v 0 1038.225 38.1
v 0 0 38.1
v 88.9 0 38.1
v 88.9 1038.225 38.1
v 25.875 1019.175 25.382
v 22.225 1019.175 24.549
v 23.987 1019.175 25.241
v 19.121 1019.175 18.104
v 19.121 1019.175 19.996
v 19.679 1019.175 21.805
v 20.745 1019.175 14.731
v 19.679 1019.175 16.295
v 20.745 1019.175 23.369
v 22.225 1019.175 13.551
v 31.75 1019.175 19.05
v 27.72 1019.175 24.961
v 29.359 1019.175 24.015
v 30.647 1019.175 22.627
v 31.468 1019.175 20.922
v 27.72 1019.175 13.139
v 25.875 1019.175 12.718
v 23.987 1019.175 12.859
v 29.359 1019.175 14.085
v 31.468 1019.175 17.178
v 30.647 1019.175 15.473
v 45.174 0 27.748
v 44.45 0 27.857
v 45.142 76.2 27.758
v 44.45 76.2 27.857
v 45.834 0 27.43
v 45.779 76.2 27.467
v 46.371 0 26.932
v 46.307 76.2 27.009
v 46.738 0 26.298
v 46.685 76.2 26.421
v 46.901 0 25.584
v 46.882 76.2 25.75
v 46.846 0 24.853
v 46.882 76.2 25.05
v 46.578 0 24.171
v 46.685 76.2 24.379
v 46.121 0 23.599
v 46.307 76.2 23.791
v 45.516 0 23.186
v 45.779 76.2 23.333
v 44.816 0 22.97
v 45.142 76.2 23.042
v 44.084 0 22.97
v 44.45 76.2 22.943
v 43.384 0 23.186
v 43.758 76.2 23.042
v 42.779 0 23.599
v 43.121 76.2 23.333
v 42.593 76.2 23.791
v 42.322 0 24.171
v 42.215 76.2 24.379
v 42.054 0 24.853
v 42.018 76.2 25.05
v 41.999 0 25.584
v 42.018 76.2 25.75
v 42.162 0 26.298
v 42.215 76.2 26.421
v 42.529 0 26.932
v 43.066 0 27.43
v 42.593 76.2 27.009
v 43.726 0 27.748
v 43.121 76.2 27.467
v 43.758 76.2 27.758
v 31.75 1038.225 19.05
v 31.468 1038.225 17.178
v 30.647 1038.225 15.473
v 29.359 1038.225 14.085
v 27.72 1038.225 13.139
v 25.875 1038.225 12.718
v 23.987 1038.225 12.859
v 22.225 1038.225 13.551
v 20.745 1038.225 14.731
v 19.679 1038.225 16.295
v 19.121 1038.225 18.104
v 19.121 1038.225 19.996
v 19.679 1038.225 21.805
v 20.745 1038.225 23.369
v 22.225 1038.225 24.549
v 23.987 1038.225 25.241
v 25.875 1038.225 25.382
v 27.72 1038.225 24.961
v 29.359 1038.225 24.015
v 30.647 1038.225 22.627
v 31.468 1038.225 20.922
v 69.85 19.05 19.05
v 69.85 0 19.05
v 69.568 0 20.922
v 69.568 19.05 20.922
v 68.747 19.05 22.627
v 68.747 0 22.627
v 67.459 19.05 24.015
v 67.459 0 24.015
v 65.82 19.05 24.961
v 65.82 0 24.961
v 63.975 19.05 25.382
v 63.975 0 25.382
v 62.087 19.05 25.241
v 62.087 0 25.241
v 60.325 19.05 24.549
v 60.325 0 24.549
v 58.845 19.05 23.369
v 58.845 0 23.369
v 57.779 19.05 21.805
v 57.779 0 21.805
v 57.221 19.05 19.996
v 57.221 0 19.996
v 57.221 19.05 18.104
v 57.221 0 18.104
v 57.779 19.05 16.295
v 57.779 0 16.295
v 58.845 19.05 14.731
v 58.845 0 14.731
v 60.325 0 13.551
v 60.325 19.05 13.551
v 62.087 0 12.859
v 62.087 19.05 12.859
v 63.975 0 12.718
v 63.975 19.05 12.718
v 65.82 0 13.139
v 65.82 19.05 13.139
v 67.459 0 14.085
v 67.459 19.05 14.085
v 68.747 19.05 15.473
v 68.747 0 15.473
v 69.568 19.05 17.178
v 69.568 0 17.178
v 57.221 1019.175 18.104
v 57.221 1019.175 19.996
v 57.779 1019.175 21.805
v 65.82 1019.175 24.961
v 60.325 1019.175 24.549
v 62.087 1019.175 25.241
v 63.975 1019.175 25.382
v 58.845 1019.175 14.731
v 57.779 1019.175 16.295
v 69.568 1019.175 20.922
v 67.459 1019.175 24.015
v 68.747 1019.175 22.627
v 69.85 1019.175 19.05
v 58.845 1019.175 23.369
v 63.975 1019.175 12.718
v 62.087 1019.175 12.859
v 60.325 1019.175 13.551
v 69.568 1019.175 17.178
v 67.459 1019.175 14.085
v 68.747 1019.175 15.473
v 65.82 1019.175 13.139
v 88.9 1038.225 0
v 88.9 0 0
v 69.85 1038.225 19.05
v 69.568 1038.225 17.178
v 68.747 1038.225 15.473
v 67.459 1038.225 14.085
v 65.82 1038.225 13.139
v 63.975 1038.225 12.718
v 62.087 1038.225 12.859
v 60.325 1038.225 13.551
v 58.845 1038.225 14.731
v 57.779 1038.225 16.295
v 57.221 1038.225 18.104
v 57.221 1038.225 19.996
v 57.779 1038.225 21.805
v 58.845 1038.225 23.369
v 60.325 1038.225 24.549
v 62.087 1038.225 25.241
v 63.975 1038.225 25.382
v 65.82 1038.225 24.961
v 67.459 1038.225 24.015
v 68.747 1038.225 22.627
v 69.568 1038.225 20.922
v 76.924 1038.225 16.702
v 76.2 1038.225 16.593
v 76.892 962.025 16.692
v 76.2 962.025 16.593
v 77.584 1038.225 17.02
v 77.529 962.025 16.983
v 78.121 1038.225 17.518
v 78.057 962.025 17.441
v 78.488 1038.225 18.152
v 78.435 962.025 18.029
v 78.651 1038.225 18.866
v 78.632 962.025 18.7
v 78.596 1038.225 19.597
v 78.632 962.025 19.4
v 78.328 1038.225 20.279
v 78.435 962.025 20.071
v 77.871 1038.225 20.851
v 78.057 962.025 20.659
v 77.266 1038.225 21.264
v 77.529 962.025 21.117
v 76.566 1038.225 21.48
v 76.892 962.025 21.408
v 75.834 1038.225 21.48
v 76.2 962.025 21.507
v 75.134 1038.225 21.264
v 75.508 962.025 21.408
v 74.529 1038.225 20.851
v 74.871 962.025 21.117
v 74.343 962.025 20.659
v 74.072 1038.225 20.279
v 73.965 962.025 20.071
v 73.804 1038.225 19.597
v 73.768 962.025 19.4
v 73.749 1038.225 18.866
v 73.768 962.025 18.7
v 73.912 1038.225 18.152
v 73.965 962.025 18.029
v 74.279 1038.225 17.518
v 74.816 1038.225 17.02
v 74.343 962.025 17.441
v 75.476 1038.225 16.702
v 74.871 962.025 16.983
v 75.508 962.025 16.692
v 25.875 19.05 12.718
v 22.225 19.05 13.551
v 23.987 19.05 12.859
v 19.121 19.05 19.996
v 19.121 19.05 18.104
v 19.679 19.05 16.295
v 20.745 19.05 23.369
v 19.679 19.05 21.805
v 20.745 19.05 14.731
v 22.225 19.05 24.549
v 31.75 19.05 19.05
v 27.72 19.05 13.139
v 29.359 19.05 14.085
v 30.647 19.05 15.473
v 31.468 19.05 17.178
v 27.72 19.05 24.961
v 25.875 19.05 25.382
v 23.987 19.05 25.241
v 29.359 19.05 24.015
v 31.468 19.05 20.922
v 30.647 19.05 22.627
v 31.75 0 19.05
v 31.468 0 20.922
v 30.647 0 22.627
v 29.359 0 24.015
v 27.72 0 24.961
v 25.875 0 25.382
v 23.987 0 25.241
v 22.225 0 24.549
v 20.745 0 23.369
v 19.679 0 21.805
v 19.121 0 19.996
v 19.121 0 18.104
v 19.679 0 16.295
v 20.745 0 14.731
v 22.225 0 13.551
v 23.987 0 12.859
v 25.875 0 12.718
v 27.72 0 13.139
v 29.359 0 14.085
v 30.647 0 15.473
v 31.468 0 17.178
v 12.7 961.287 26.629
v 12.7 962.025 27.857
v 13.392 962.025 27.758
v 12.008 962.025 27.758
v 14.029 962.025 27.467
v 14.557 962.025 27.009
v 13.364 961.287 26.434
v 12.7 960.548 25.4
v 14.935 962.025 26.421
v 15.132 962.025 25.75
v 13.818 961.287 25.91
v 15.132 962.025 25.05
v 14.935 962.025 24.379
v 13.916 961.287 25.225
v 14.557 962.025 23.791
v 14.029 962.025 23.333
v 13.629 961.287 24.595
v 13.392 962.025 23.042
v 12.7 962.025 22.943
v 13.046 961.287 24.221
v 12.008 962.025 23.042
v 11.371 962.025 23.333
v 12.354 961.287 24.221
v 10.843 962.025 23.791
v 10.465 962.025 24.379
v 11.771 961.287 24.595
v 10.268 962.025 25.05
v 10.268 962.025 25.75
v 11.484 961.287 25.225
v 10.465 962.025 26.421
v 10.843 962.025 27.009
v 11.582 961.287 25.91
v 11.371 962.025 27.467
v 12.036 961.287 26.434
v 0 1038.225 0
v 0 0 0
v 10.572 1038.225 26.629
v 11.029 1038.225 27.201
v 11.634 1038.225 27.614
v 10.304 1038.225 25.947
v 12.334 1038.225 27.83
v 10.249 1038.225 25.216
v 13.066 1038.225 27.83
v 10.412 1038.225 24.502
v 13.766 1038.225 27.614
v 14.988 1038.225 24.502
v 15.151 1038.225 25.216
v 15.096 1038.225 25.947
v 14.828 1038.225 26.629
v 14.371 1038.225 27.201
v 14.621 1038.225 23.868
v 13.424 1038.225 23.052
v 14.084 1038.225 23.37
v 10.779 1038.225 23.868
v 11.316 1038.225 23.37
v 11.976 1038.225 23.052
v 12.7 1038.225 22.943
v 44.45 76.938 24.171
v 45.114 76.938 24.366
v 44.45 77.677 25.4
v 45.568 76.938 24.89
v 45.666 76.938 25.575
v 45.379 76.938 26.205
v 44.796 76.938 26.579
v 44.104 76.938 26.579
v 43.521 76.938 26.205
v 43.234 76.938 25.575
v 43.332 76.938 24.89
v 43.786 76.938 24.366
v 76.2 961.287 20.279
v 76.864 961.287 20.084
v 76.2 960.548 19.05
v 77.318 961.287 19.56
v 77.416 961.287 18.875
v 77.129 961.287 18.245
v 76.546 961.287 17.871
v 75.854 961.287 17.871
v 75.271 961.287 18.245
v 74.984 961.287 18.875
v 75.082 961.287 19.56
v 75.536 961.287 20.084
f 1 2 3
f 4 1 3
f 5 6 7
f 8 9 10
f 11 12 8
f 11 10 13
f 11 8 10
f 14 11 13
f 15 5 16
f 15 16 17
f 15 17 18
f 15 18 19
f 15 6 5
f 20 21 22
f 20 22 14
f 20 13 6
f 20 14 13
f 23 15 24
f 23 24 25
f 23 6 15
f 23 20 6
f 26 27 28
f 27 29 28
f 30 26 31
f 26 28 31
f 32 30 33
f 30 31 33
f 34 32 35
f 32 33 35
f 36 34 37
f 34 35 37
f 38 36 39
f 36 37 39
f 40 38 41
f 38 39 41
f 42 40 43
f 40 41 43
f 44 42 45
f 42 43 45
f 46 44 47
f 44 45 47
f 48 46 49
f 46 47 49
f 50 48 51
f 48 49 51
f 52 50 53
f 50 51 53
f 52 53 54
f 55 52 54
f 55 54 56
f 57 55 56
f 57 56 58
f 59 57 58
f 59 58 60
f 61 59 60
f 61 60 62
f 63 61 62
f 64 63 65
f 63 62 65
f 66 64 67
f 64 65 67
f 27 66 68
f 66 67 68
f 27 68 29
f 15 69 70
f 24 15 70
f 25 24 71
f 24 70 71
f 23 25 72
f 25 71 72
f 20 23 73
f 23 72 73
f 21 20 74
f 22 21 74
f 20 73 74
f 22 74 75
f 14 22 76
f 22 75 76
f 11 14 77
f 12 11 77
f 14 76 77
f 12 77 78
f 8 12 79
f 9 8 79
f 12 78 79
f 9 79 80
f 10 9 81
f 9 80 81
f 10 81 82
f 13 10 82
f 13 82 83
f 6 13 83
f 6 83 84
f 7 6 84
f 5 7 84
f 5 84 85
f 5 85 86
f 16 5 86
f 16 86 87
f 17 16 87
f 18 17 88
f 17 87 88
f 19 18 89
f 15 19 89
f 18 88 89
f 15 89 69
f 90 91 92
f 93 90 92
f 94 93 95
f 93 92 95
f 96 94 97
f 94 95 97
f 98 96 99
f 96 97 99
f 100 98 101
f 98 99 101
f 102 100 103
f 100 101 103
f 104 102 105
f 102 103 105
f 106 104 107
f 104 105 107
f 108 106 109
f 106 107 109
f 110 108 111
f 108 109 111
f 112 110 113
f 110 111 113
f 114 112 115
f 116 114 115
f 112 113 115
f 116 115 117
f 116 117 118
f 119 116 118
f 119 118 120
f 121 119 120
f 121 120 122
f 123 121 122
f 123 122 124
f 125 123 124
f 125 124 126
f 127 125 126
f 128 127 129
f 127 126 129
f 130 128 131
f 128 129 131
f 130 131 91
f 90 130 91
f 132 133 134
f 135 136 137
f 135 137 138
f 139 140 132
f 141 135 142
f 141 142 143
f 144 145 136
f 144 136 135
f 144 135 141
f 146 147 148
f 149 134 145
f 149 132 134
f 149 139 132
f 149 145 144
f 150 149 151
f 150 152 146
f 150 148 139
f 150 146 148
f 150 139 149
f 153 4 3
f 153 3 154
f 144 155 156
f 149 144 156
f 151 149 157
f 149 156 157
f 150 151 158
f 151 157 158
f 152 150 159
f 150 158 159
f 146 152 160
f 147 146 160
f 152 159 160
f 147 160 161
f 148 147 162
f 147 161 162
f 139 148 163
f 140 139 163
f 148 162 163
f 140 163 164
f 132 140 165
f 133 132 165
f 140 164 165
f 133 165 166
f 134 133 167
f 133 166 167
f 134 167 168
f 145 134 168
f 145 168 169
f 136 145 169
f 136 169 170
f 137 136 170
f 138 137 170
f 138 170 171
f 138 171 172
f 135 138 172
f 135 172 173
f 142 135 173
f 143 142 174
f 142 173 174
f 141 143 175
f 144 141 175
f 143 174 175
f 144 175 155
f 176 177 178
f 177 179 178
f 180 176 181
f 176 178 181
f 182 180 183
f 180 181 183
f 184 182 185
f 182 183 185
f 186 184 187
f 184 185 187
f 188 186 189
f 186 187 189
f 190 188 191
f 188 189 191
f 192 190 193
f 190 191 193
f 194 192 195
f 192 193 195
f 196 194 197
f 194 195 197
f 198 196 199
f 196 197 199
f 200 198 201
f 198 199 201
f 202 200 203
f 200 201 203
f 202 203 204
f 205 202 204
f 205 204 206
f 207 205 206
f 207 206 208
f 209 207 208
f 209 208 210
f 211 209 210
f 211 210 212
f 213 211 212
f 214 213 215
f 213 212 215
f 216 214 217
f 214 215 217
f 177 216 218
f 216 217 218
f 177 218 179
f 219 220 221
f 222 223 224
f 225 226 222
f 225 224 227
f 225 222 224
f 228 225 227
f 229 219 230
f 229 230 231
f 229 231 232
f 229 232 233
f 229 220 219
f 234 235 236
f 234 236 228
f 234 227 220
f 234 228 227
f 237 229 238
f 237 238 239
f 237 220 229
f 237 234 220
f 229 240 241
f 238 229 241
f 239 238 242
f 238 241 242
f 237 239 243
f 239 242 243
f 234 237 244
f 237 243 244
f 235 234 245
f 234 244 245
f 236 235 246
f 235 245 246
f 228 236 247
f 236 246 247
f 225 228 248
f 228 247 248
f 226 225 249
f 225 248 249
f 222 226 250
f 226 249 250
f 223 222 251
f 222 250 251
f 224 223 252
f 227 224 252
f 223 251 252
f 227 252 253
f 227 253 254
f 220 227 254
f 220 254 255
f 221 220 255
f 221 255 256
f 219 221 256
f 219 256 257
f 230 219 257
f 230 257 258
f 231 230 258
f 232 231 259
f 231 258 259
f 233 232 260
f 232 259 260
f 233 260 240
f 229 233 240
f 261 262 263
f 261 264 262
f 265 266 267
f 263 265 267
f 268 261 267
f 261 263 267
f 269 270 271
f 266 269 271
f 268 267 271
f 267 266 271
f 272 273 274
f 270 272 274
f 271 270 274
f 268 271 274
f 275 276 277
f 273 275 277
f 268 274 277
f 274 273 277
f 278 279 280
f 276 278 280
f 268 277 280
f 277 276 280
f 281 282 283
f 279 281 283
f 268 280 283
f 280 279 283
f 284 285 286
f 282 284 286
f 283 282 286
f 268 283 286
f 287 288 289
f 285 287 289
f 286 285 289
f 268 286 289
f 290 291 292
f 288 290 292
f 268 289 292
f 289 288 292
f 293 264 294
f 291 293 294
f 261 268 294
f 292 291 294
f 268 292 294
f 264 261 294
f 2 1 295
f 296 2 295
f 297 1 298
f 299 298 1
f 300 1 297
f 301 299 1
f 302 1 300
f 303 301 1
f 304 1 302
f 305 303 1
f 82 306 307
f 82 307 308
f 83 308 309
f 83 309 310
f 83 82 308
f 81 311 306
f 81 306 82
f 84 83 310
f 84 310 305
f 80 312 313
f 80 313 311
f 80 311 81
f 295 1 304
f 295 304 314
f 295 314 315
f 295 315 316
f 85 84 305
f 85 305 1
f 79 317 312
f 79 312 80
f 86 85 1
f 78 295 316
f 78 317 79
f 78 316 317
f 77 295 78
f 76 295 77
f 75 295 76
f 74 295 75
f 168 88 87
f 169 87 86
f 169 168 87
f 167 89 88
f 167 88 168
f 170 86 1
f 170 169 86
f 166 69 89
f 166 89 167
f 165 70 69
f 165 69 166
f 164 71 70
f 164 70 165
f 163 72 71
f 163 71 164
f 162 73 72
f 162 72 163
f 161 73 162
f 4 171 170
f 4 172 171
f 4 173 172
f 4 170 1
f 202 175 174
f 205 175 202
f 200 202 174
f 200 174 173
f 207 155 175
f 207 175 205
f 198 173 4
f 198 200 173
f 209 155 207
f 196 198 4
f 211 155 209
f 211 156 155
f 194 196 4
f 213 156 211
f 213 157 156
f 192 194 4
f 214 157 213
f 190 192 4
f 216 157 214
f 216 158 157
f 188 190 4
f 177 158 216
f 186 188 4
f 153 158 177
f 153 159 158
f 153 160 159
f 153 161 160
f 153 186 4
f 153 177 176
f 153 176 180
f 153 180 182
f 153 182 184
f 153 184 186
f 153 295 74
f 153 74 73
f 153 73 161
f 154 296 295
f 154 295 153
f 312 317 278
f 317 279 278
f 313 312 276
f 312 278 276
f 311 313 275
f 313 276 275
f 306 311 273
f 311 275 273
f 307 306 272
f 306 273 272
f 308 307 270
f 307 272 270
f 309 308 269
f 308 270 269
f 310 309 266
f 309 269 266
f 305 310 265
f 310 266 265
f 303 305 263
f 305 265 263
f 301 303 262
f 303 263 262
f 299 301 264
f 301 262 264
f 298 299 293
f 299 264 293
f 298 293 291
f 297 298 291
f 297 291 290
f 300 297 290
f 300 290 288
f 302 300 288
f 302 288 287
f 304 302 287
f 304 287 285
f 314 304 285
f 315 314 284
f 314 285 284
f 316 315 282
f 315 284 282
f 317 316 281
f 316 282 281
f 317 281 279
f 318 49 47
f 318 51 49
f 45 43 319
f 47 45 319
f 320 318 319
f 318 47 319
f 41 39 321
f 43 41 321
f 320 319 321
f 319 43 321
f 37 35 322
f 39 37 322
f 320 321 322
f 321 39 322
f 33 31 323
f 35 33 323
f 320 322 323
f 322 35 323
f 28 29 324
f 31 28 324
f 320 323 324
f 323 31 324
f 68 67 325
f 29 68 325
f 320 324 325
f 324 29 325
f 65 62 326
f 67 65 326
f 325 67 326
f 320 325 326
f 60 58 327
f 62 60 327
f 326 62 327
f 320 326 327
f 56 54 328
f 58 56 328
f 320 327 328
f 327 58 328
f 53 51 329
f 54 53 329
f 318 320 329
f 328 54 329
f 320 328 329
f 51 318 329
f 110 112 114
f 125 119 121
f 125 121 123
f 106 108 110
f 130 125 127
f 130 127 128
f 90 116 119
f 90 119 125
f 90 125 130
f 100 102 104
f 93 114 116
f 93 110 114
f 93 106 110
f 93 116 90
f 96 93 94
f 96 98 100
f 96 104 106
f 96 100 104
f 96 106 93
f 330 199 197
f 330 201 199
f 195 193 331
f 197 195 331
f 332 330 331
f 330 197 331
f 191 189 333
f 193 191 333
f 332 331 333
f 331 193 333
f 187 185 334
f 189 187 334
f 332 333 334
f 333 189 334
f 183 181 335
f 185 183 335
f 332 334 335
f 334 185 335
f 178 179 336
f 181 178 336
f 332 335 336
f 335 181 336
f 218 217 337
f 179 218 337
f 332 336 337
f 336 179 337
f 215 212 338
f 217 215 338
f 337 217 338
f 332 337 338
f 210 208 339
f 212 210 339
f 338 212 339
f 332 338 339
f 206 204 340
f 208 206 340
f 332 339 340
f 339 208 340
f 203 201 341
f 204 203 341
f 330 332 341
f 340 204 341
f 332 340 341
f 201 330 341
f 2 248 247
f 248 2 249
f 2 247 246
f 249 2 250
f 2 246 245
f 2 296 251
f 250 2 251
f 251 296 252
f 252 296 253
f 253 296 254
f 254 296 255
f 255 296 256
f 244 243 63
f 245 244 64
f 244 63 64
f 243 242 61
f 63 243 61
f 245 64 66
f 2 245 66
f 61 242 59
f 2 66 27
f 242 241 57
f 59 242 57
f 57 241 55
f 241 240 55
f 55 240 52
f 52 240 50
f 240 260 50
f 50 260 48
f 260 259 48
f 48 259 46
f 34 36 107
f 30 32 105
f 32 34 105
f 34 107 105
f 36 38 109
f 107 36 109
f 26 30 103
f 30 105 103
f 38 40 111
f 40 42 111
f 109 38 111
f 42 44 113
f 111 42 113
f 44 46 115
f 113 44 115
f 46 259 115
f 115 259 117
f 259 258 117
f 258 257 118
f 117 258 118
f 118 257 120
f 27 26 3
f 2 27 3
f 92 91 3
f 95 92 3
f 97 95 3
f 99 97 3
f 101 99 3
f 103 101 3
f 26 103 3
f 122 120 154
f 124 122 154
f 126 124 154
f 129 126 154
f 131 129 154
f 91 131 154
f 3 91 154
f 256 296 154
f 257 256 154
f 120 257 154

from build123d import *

# Parameters (mm, degrees)
SKETCH1_W                                  = 88.9
SKETCH1_H                                  = 38.1
BOSS_EXTRUDE1_DEPTH                        = 1038.225
SKETCH2_R                                  = 6.35
CUT_EXTRUDE1_DEPTH                         = 19.05
SKETCH3_R                                  = 6.35
CUT_EXTRUDE2_DEPTH                         = 19.05
F_10_0_1935_DIAMETER_HOLE1_D               = 4.9149
F_10_0_1935_DIAMETER_HOLE1_DEPTH           = 76.2
F_10_0_1935_DIAMETER_HOLE1_TIP             = 1.476584928
F_10_0_1935_DIAMETER_HOLE1_ON_FACE_2_D     = 4.9149
F_10_0_1935_DIAMETER_HOLE1_ON_FACE_2_DEPTH = 76.2
F_10_0_1935_DIAMETER_HOLE1_ON_FACE_2_TIP   = 1.476584928


with BuildPart() as part:
    # Sketch1 → Boss-Extrude1 (new body)
    with BuildSketch(Plane(origin=(0, 0, 0), x_dir=(1, 0, 0), z_dir=(0, 1, 0))):
        with Locations((44.45, -19.05)):
            Rectangle(SKETCH1_W, SKETCH1_H)
    extrude(amount=BOSS_EXTRUDE1_DEPTH)

    # Sketch2 → Cut-Extrude1 (cut)
    with BuildSketch(Plane(origin=(0, 1038.225, 0), x_dir=(1, 0, 0), z_dir=(0, 1, 0))):
        with Locations((25.4, -19.05)):
            Circle(SKETCH2_R)
        with Locations((63.5, -19.05)):
            Circle(SKETCH2_R)
    extrude(amount=-CUT_EXTRUDE1_DEPTH, mode=Mode.SUBTRACT)

    # Sketch3 → Cut-Extrude2 (cut)
    with BuildSketch(Plane.XZ):
        with Locations((25.4, 19.05)):
            Circle(SKETCH3_R)
        with Locations((63.5, 19.05)):
            Circle(SKETCH3_R)
    extrude(amount=-CUT_EXTRUDE2_DEPTH, mode=Mode.SUBTRACT)

    # #10 (0.1935) Diameter Hole1
    with Locations(Plane(origin=(44.45, 0, 25.4), x_dir=(0, 0, -1), z_dir=(0, -1, 0))):
        with Locations((0, 0)):
            Hole(F_10_0_1935_DIAMETER_HOLE1_D / 2, depth=F_10_0_1935_DIAMETER_HOLE1_DEPTH)
            with Locations((0, 0, -(F_10_0_1935_DIAMETER_HOLE1_DEPTH + F_10_0_1935_DIAMETER_HOLE1_TIP / 2))):  # 118° drill point
                Cone(0, F_10_0_1935_DIAMETER_HOLE1_D / 2, F_10_0_1935_DIAMETER_HOLE1_TIP, mode=Mode.SUBTRACT)

    # #10 (0.1935) Diameter Hole1 on face 2
    with Locations(Plane(origin=(12.7, 1038.225, 25.4), x_dir=(0, 0, 1), z_dir=(0, 1, 0))):
        with Locations((0, 0), (-6.35, 63.5)):
            Hole(F_10_0_1935_DIAMETER_HOLE1_ON_FACE_2_D / 2, depth=F_10_0_1935_DIAMETER_HOLE1_ON_FACE_2_DEPTH)
            with Locations((0, 0, -(F_10_0_1935_DIAMETER_HOLE1_ON_FACE_2_DEPTH + F_10_0_1935_DIAMETER_HOLE1_ON_FACE_2_TIP / 2))):  # 118° drill point
                Cone(0, F_10_0_1935_DIAMETER_HOLE1_ON_FACE_2_D / 2, F_10_0_1935_DIAMETER_HOLE1_ON_FACE_2_TIP, mode=Mode.SUBTRACT)


solid = part.part
